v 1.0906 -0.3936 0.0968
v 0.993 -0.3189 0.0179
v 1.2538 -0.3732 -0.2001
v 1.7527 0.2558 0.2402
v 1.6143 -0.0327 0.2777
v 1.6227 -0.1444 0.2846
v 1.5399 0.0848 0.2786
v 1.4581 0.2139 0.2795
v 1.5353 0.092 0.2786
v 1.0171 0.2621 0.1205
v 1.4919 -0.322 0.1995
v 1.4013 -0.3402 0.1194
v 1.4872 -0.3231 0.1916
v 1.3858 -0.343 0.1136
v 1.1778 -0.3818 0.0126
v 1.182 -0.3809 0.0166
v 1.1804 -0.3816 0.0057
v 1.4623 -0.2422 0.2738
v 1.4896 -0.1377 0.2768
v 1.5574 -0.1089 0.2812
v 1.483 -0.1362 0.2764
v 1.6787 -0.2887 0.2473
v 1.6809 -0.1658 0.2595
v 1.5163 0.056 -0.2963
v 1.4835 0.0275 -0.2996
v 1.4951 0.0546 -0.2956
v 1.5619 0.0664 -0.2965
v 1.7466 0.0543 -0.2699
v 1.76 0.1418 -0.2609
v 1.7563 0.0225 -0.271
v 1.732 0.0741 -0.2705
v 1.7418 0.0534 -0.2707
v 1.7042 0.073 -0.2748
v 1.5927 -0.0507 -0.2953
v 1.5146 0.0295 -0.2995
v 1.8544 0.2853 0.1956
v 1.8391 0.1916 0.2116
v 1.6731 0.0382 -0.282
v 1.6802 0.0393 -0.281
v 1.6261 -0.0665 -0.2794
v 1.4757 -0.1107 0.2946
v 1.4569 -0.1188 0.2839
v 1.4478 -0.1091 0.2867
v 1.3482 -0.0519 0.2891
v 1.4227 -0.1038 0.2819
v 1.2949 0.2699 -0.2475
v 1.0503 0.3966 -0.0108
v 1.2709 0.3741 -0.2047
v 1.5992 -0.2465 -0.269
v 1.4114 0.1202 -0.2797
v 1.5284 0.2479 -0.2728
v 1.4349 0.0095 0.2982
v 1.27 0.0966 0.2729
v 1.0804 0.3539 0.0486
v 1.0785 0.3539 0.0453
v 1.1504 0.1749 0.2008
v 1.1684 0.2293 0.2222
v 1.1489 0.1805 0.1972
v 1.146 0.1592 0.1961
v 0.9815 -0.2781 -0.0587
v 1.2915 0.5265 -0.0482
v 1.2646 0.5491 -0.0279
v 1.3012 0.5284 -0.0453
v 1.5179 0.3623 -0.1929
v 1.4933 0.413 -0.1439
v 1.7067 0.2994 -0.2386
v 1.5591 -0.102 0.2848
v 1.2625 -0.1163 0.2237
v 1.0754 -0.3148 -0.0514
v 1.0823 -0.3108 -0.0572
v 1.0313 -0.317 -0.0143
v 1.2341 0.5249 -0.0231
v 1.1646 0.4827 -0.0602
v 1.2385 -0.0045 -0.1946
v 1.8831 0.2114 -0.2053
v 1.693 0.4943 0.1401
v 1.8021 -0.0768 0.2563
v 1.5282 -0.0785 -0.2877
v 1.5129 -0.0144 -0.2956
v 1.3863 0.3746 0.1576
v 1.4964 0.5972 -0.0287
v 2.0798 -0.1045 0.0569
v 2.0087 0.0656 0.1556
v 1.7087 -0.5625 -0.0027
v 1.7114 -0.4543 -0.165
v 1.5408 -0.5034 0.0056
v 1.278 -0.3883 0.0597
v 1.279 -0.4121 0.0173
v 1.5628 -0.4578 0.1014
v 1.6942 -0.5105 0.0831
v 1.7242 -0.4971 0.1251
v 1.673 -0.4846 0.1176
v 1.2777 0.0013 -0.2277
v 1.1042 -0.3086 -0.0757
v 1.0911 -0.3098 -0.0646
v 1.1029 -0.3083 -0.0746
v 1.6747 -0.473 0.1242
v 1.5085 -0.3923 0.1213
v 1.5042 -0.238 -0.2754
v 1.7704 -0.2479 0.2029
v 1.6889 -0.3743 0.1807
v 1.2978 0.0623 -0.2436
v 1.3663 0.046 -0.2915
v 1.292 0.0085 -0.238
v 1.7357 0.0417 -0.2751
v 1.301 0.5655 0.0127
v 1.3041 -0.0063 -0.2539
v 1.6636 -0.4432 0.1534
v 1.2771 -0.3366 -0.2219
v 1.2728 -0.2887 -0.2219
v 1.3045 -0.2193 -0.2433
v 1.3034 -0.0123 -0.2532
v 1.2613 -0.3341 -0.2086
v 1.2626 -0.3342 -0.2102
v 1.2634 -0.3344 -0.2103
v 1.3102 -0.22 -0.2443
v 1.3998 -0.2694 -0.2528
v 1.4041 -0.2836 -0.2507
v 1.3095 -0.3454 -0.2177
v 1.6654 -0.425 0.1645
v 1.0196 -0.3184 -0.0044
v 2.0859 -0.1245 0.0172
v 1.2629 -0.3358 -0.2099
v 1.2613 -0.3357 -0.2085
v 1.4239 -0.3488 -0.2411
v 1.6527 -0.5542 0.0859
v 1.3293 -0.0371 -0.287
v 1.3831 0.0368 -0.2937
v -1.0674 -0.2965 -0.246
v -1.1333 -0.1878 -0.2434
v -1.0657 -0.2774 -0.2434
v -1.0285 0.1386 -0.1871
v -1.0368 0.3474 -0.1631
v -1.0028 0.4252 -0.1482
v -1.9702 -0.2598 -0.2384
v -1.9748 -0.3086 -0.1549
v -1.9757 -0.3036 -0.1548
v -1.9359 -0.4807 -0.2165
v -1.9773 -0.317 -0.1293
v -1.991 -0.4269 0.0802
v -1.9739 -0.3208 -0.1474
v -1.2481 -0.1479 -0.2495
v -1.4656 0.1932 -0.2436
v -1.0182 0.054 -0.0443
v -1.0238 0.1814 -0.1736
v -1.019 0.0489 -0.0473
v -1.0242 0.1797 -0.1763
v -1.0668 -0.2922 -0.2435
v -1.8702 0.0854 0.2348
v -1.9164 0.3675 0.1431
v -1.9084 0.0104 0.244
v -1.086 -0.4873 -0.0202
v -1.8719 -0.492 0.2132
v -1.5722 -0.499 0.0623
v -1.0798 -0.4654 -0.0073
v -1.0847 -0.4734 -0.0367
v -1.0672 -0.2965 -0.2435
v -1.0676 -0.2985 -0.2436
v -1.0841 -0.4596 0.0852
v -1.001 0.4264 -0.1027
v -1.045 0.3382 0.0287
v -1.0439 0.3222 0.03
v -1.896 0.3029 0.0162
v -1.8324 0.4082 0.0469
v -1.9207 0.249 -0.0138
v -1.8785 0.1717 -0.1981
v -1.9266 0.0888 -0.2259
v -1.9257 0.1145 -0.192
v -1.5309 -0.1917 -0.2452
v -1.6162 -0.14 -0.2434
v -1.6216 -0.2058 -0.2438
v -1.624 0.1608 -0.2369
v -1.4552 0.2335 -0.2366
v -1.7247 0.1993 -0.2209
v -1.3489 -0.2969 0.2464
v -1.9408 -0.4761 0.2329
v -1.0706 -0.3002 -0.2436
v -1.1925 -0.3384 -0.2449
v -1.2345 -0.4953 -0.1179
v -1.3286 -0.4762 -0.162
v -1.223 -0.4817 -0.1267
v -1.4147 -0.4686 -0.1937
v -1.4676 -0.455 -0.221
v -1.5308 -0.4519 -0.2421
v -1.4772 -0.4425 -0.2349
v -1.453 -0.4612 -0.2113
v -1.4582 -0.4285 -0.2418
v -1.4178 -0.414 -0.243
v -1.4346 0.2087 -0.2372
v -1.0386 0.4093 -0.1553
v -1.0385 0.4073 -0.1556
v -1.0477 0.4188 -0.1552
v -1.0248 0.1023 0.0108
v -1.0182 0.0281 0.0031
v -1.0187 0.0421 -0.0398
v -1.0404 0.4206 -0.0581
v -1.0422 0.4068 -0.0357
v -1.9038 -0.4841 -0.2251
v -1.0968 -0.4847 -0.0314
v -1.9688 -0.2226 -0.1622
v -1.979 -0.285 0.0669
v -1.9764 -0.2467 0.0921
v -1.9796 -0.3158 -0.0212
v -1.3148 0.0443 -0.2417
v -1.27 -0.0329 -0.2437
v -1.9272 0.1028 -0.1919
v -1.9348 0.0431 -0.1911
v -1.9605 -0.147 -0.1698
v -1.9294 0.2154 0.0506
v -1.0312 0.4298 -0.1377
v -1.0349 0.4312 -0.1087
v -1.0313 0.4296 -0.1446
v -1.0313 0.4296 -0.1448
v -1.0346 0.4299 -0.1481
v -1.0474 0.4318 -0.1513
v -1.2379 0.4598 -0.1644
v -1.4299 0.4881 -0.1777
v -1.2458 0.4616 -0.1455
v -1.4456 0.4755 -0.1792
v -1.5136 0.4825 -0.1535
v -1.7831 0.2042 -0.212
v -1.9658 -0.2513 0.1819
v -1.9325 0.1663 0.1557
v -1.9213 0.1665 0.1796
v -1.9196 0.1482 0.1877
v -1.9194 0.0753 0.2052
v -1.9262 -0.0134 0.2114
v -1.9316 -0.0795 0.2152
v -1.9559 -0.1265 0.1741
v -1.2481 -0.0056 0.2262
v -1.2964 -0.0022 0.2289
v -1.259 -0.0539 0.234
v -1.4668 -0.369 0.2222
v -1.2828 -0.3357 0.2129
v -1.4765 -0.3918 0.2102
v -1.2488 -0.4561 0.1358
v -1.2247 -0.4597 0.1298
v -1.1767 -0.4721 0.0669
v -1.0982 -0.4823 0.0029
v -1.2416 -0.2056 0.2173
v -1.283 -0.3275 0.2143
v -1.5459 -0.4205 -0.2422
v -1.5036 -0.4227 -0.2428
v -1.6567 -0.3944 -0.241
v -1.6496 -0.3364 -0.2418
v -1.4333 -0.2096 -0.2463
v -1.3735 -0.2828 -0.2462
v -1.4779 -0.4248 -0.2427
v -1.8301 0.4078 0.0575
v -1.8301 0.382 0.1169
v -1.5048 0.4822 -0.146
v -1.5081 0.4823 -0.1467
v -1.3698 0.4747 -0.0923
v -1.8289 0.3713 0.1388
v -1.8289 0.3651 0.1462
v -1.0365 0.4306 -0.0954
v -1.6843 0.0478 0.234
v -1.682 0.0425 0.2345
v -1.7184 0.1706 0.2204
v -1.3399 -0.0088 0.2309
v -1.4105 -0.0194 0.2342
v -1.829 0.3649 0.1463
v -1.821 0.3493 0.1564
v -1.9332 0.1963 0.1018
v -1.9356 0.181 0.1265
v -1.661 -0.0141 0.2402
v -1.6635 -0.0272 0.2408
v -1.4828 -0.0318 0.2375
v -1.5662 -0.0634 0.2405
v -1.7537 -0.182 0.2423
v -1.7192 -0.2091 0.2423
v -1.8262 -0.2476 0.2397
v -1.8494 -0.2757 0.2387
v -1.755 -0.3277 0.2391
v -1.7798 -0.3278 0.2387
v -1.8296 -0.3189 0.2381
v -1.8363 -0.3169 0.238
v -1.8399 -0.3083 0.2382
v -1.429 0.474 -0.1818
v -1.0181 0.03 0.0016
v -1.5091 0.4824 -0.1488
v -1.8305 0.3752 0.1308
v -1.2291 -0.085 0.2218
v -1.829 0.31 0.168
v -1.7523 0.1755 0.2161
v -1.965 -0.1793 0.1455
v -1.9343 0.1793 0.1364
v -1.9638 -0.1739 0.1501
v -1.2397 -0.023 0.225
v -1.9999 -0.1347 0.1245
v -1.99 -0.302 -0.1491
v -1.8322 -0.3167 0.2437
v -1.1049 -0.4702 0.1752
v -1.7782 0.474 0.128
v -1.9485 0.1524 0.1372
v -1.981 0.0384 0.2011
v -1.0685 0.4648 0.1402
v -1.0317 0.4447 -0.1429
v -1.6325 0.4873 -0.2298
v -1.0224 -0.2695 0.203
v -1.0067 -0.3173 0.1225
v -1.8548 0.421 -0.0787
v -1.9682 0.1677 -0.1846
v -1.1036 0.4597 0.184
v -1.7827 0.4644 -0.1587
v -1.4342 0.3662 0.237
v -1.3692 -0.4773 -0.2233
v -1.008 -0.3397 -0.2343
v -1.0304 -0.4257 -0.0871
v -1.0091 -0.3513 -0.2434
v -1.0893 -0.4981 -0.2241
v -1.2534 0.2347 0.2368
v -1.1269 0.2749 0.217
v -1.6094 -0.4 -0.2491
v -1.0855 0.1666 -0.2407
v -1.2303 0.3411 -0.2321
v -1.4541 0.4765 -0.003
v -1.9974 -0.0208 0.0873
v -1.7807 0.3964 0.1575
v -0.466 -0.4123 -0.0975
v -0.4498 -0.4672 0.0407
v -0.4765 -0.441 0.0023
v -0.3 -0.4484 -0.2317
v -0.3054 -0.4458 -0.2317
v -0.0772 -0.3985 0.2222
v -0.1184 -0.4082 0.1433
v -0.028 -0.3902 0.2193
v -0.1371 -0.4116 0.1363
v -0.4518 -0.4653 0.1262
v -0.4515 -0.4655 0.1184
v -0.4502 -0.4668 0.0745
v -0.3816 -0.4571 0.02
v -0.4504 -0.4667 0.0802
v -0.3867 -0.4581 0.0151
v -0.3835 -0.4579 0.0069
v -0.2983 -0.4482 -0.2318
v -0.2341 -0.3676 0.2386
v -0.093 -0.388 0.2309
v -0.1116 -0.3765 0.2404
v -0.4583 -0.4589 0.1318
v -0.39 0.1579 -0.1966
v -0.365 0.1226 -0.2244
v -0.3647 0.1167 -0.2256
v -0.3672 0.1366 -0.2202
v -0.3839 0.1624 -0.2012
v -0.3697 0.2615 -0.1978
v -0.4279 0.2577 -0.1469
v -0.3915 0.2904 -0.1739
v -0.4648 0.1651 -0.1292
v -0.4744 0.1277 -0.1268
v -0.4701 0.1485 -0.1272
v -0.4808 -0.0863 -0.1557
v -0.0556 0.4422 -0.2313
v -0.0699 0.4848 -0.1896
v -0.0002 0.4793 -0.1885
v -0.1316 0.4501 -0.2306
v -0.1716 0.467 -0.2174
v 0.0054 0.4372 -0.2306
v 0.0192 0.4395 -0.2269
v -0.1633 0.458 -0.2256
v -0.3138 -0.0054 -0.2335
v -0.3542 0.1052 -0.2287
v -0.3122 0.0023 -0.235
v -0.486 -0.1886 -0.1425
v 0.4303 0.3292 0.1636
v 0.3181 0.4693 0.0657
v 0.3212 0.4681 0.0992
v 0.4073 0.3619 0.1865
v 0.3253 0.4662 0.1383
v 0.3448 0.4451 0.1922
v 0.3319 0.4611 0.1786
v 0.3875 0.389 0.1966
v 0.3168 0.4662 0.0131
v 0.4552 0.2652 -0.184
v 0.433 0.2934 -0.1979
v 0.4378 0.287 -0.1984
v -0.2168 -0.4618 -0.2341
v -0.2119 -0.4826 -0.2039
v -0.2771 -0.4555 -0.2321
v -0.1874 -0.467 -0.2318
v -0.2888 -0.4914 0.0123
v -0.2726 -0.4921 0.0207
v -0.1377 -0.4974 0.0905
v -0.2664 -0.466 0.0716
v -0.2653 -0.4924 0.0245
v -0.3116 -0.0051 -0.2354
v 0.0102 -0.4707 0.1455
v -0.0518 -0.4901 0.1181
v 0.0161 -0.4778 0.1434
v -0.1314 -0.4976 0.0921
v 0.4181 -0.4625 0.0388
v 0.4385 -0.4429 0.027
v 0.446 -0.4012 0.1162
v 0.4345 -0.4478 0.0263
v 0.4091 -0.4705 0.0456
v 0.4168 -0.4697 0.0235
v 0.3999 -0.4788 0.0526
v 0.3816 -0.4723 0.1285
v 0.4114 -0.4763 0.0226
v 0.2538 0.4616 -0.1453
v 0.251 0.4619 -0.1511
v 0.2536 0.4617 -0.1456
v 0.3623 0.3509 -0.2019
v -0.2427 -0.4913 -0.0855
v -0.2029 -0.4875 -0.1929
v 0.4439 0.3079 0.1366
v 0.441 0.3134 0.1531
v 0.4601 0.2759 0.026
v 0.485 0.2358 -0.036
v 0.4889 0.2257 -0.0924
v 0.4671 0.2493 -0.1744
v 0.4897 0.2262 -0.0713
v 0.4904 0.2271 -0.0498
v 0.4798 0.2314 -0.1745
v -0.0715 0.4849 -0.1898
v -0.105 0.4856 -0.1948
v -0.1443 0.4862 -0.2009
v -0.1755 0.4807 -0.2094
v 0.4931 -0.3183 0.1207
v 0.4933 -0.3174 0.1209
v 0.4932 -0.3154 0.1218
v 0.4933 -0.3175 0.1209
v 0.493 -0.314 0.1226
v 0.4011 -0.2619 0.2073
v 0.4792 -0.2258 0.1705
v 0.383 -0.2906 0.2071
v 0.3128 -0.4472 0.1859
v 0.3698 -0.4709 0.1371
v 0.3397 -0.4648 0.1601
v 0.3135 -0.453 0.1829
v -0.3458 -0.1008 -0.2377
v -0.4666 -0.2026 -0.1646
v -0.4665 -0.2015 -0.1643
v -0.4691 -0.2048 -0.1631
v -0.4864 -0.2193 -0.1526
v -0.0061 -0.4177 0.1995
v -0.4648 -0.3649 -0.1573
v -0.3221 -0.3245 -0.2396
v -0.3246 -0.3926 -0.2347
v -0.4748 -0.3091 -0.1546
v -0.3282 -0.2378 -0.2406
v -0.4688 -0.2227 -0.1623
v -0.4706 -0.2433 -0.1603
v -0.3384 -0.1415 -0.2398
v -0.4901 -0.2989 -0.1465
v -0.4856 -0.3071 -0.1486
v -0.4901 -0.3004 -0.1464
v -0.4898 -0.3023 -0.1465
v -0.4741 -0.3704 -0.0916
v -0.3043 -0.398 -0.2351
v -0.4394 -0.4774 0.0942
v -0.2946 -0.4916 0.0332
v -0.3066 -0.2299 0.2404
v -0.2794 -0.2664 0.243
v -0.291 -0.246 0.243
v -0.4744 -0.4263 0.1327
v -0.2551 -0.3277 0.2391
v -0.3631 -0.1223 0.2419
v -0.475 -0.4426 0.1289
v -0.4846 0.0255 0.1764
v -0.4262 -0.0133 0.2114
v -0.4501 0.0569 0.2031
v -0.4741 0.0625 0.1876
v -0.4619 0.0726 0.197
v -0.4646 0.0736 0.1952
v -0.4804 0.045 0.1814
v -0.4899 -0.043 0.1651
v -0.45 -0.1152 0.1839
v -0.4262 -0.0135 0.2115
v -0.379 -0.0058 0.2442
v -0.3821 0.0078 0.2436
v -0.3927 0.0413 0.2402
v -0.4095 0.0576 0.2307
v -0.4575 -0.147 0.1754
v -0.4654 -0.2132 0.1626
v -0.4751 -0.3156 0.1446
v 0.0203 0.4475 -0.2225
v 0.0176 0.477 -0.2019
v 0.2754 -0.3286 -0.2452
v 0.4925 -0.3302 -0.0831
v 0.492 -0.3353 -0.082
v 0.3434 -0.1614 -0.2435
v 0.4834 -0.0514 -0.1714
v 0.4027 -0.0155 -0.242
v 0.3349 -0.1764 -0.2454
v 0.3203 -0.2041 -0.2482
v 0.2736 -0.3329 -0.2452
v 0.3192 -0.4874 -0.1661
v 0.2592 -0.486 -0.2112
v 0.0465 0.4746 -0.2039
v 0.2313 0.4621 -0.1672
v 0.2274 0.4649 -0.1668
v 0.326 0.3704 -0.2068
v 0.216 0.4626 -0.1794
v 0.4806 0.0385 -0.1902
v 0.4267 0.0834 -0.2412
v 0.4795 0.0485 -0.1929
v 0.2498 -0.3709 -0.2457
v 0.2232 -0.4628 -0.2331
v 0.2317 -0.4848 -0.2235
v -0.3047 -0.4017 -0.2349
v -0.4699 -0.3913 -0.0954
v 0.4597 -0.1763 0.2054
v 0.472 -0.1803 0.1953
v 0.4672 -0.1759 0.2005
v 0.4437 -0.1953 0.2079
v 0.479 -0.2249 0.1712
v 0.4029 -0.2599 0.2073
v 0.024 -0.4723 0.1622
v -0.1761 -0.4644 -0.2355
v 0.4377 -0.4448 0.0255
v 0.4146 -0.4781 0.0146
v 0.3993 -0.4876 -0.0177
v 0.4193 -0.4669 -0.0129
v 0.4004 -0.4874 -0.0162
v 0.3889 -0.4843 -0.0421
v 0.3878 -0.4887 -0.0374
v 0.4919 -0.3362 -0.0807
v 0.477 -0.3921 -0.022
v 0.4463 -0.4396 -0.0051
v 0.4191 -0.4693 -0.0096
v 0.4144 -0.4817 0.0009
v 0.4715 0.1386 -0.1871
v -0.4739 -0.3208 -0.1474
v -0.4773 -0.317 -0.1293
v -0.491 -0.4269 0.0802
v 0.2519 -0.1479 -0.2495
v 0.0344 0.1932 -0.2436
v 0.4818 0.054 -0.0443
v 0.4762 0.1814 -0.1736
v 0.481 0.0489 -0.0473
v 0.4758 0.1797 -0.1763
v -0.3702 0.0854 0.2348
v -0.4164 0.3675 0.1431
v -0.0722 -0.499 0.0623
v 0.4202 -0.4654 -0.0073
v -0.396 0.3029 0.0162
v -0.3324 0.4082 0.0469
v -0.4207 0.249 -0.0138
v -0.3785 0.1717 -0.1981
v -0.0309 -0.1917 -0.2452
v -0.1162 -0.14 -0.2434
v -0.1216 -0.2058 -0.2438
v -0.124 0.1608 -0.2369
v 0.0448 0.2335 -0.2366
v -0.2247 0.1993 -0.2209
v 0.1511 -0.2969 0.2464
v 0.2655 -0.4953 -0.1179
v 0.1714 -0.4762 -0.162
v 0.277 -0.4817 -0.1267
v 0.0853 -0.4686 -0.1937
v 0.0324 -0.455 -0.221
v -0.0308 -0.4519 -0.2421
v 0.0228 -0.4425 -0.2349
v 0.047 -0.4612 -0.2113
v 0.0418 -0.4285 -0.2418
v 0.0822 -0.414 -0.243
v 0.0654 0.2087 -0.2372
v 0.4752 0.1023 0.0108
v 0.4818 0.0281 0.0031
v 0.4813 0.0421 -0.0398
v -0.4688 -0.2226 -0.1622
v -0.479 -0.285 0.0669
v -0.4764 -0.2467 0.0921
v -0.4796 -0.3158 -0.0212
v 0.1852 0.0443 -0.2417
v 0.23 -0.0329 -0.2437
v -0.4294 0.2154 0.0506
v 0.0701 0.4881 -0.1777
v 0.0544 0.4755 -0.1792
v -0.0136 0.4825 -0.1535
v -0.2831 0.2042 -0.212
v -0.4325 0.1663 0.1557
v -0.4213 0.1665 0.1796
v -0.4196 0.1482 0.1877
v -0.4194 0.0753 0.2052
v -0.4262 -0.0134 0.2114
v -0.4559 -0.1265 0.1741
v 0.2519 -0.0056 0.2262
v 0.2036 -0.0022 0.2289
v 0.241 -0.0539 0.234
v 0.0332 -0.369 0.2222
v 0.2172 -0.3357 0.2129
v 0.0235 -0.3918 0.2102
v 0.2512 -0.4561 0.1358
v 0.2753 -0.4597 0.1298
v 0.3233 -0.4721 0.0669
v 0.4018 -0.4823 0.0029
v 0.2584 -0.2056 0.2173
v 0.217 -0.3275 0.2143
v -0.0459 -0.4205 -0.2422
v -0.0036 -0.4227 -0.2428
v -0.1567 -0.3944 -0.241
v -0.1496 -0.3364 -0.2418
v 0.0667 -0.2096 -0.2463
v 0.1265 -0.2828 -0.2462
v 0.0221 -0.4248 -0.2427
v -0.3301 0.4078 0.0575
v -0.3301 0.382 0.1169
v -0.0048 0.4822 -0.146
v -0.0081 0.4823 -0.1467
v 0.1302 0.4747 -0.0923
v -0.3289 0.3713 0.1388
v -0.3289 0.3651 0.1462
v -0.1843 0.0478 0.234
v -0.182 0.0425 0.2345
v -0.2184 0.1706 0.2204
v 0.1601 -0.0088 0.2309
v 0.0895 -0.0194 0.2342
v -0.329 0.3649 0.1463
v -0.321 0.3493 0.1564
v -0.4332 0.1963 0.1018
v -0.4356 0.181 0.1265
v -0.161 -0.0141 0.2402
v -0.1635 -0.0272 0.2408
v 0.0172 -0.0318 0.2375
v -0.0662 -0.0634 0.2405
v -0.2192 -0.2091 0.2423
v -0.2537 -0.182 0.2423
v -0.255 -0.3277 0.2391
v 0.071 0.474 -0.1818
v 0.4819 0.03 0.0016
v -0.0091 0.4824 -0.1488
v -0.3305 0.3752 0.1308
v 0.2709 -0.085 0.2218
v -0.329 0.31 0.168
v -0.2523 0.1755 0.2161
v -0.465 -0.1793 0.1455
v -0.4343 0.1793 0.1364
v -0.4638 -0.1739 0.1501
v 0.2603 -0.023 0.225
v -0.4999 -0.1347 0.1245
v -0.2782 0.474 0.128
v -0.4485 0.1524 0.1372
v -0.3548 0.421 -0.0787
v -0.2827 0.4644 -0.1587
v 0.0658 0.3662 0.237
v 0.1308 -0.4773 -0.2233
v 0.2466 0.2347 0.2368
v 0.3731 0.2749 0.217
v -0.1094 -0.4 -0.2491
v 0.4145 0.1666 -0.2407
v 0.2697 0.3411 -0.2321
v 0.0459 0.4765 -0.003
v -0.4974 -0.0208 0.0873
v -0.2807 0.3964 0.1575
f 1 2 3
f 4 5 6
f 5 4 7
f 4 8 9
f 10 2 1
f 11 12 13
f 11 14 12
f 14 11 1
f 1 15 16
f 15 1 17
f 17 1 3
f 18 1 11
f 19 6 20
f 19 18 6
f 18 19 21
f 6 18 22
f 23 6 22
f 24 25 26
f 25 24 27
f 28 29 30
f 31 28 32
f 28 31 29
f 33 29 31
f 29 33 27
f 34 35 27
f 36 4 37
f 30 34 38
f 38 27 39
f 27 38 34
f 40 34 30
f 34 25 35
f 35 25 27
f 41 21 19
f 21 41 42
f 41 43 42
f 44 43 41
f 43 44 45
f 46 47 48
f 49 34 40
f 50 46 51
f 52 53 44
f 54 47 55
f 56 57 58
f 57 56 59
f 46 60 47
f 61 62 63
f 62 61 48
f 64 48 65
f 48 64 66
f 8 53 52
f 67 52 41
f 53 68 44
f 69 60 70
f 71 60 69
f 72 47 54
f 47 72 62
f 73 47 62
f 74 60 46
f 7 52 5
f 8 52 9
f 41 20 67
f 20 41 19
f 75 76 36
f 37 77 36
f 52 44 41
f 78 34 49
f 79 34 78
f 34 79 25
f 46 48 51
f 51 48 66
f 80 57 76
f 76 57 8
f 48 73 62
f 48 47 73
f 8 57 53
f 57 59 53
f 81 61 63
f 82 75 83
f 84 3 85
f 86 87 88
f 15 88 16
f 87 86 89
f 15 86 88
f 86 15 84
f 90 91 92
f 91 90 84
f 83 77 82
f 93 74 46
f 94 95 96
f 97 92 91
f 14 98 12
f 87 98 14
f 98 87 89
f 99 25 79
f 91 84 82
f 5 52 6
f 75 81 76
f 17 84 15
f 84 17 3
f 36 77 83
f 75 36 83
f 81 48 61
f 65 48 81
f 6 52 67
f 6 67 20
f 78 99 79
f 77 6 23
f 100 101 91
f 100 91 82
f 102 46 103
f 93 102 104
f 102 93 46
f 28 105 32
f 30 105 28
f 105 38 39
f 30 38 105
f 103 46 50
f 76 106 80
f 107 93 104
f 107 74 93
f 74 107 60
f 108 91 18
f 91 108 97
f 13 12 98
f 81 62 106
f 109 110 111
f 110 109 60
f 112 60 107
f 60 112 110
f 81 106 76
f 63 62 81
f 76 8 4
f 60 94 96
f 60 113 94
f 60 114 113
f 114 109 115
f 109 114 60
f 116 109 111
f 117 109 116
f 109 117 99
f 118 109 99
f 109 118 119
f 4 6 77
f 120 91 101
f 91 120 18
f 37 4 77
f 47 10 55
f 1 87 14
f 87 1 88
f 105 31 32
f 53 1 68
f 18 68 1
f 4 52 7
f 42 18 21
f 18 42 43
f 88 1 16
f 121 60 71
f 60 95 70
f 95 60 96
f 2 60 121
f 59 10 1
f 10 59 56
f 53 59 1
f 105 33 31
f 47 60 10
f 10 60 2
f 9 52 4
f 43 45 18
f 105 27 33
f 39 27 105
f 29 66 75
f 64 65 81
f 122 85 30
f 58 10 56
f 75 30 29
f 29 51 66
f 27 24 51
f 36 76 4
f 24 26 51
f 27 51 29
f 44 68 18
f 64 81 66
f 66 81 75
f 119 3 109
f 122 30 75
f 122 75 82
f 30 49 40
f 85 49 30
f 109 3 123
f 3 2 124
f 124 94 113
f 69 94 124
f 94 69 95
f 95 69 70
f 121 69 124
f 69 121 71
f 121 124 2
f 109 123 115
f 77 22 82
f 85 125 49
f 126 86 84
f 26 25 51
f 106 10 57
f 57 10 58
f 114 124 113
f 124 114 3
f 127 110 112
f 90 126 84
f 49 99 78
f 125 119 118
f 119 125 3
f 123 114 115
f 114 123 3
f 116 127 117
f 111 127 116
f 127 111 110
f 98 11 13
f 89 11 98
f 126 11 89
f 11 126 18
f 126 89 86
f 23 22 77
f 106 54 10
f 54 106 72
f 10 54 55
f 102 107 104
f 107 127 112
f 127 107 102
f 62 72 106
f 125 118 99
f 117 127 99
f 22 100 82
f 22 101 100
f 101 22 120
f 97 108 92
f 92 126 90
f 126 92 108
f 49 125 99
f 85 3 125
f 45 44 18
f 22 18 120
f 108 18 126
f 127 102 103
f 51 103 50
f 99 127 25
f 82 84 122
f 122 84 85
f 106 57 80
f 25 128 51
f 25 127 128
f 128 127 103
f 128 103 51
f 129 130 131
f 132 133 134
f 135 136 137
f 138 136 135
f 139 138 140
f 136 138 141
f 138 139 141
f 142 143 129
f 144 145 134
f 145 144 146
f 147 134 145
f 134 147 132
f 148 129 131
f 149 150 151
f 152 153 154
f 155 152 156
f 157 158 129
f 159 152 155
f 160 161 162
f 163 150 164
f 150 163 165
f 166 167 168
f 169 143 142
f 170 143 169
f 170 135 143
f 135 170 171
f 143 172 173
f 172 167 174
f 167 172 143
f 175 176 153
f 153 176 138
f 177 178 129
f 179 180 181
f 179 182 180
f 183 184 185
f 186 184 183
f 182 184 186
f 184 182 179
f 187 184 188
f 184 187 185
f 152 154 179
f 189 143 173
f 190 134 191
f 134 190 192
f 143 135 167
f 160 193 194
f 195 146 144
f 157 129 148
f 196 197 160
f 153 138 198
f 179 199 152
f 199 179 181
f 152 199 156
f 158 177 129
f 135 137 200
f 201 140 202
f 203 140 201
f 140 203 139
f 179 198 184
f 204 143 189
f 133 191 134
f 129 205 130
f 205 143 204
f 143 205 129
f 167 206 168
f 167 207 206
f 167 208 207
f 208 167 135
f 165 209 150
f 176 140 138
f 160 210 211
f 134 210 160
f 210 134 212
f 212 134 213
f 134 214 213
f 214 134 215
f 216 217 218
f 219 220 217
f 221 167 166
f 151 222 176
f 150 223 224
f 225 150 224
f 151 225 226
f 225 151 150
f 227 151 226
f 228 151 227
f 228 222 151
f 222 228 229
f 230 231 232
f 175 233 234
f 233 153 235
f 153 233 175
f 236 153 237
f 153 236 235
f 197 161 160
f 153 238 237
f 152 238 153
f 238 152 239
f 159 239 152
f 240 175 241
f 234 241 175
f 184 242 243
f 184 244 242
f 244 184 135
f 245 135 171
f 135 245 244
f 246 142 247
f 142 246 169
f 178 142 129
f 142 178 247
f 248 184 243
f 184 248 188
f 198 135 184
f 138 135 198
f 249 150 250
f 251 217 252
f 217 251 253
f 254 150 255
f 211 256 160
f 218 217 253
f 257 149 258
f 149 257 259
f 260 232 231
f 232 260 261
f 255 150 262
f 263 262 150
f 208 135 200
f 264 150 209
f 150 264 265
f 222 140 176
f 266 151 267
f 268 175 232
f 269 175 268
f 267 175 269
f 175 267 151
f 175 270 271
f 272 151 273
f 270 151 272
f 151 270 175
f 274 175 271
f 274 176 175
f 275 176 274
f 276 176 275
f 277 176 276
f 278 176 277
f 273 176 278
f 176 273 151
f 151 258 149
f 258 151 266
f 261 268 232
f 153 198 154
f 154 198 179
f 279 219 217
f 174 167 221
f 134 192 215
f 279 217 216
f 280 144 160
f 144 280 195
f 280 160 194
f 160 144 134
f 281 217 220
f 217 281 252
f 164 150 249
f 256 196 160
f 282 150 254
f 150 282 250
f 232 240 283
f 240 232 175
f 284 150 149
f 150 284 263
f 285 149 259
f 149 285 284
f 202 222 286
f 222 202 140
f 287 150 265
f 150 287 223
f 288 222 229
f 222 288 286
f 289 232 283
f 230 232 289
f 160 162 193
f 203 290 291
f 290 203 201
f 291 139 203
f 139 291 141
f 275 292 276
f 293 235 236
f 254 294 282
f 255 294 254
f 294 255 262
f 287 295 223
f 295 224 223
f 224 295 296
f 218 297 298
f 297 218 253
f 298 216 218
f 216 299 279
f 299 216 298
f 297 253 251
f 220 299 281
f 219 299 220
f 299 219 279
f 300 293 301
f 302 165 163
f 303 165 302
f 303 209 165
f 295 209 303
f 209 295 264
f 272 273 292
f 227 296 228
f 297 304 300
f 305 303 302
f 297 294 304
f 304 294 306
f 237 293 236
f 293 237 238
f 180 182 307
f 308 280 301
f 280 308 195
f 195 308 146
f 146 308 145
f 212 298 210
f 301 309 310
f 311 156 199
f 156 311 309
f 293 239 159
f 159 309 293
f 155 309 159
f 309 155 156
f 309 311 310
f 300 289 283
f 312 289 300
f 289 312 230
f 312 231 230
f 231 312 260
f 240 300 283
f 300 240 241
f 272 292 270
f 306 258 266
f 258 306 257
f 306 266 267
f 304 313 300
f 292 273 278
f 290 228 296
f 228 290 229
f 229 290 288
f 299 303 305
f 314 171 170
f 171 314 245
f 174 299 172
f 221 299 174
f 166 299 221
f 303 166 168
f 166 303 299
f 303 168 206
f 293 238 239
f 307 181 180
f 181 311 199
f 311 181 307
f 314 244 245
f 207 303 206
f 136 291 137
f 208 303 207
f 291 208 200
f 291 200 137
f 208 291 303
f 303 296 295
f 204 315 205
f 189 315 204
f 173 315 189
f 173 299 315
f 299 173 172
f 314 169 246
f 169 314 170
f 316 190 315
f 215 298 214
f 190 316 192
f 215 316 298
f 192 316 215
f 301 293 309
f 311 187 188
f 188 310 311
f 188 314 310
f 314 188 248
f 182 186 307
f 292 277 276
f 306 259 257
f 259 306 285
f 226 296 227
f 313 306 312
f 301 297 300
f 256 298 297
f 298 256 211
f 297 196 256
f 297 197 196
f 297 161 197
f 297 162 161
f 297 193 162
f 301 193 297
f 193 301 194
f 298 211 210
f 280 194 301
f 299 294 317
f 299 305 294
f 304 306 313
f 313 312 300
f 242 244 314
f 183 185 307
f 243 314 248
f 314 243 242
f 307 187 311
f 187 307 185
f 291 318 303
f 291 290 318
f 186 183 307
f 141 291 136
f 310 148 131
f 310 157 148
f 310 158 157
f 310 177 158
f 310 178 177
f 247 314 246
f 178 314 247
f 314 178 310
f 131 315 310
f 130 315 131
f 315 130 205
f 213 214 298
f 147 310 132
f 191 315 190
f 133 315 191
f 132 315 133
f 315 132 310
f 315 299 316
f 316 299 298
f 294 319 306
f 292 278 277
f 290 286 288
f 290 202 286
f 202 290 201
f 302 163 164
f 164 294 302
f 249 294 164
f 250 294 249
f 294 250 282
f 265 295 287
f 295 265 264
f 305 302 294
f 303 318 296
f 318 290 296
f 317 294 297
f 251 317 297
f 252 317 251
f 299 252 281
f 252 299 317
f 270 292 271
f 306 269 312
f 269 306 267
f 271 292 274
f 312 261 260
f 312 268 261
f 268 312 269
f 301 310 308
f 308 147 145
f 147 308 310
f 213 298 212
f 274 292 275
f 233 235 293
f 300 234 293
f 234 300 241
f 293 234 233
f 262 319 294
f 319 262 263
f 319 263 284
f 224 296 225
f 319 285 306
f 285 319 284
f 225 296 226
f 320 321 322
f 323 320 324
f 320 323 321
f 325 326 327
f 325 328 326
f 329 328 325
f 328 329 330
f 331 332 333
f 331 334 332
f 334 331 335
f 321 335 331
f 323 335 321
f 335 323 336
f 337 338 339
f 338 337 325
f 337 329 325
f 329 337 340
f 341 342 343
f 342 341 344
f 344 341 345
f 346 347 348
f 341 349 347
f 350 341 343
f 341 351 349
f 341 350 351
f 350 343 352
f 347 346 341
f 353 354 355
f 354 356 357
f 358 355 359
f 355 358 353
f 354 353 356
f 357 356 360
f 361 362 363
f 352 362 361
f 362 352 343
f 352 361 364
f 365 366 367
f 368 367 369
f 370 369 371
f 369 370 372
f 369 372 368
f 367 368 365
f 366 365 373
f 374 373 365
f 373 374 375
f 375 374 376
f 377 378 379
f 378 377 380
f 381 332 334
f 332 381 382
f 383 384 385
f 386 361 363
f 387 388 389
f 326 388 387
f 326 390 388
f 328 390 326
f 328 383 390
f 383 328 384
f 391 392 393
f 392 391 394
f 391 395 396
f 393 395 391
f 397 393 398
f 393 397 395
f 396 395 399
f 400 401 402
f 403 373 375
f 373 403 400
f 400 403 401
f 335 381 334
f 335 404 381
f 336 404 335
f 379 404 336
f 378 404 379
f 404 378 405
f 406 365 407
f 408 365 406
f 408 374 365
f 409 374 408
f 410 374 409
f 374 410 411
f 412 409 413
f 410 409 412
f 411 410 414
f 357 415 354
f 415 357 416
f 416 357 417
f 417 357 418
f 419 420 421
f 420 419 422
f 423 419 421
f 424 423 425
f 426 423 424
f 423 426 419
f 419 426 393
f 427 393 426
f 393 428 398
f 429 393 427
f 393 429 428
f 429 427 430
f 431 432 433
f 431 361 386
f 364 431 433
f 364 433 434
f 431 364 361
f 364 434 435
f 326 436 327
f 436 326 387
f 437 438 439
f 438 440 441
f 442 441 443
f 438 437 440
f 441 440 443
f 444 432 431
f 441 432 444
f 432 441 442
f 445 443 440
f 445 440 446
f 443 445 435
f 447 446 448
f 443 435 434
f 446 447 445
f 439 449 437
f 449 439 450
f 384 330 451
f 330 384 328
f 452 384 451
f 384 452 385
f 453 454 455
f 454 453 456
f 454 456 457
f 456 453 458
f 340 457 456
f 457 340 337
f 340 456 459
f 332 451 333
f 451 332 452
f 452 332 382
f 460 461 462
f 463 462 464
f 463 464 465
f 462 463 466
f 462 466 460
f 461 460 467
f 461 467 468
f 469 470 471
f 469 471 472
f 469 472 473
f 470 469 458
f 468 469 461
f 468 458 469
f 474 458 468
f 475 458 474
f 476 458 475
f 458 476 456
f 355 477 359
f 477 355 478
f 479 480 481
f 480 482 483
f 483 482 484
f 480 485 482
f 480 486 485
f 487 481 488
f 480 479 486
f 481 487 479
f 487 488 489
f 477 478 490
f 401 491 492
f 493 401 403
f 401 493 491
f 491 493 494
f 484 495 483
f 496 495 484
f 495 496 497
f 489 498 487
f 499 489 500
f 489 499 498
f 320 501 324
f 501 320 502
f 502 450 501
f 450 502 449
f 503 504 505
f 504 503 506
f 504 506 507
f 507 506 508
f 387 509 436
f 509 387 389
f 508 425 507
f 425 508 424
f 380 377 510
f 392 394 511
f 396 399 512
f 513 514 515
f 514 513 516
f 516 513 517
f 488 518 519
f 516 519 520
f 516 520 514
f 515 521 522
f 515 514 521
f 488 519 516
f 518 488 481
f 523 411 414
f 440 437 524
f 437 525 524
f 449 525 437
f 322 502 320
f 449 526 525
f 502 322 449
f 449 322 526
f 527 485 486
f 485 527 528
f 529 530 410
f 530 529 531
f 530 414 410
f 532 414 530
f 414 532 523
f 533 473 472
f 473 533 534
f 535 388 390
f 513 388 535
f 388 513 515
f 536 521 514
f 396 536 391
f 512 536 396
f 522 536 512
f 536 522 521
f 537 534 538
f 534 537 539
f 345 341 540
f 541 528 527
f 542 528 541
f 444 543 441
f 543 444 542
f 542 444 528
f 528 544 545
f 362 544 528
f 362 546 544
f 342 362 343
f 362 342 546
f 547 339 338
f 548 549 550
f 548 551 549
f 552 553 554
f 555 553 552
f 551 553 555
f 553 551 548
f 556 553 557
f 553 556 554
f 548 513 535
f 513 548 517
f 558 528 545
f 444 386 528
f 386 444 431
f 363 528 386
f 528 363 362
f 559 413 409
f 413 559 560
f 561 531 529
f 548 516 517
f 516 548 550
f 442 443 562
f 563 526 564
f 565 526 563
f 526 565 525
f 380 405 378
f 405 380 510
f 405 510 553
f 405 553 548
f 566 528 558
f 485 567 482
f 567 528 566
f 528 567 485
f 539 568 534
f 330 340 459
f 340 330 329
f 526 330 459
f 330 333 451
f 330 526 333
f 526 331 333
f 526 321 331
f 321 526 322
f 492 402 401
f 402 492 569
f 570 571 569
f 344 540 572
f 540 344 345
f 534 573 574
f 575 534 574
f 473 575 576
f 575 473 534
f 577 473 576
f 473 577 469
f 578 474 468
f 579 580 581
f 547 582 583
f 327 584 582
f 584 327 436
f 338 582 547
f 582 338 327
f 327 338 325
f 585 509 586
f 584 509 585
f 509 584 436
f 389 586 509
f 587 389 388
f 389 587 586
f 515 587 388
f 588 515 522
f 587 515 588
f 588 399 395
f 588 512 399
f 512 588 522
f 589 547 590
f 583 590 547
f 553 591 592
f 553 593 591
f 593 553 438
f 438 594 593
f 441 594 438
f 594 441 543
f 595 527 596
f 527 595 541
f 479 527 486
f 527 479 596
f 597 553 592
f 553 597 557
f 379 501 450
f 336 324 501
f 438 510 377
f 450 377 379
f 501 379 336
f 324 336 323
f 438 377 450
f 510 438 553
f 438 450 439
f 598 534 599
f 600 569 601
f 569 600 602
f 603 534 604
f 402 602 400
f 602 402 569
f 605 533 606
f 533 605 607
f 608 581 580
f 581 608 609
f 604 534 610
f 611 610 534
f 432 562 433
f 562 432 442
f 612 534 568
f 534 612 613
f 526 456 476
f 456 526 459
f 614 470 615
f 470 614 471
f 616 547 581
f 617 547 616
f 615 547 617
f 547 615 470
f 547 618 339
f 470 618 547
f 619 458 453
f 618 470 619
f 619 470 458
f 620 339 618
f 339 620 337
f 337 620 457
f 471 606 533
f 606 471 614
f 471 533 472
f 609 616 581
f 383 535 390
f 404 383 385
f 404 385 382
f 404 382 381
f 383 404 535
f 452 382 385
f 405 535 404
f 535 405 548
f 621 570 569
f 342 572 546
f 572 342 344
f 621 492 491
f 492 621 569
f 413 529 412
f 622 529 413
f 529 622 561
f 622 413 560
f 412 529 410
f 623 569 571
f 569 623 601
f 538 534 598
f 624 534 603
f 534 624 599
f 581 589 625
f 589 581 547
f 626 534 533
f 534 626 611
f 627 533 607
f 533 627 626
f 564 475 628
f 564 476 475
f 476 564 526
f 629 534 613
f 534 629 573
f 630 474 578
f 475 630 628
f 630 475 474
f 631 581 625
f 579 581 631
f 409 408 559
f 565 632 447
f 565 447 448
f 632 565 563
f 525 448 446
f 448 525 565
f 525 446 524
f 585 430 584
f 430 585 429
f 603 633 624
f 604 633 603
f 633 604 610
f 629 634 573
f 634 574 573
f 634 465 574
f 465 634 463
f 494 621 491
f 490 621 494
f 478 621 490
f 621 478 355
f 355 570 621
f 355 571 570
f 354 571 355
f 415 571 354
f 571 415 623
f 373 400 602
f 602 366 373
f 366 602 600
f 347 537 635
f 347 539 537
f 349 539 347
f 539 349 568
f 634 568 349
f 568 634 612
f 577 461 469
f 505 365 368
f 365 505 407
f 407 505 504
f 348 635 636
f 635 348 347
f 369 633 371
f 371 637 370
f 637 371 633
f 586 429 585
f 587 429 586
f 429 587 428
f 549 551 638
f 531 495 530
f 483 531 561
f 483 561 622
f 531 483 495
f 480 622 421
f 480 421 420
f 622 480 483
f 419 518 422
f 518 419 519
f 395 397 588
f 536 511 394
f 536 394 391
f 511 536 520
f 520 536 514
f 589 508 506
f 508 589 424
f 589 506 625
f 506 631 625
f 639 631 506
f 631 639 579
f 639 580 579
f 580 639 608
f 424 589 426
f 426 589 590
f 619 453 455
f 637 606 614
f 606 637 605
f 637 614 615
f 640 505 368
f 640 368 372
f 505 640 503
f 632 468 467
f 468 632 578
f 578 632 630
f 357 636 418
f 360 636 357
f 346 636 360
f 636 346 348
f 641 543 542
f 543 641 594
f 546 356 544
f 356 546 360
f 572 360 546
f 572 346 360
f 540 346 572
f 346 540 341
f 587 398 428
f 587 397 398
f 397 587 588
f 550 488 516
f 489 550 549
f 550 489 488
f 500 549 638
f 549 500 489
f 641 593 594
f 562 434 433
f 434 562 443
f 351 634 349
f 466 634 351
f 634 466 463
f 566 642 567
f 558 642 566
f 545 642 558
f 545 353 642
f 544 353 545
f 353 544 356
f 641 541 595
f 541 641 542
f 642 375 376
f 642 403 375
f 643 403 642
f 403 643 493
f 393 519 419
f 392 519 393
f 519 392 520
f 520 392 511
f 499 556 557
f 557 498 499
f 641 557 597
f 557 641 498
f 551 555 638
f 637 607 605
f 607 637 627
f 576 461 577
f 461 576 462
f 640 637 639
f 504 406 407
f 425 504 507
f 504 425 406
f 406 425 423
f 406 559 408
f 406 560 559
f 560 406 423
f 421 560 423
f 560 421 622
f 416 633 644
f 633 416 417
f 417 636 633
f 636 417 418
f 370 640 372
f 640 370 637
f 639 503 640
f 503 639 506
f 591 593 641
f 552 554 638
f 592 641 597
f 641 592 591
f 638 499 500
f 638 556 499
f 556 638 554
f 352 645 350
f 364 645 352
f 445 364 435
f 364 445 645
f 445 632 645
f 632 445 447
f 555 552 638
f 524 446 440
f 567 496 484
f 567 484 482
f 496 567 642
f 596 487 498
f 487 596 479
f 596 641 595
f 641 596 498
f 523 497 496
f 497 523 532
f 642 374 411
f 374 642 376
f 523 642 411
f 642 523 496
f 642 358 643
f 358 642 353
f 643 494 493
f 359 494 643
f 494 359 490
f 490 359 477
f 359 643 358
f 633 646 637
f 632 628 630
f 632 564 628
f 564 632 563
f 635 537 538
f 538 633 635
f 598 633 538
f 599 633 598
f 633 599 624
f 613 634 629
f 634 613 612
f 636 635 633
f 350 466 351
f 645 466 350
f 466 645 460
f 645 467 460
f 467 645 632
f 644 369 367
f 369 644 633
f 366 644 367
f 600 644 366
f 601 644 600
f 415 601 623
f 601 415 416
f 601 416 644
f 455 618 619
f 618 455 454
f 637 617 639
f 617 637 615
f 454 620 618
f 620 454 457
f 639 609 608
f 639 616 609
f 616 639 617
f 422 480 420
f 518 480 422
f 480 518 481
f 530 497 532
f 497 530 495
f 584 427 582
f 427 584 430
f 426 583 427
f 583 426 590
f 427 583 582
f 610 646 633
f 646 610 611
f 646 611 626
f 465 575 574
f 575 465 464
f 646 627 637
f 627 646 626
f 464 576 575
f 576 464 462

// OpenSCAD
Seed=1;//[0:1000]
s=1.2;//[0.8:0.01:1.5]
color("Grey")translate([1.5,0,0])scale([1,1,0.5])boulder(Seed);
color("DarkGrey")translate([-1.5,0,0])scale([1,1,0.5])cutstone(Seed);

intersection(){
color("Grey")translate([0,0,0])scale([s,s,s*0.5])boulder(Seed);
color("DarkGrey")translate([0,0,0])scale([1,1,0.5])cutstone(Seed);
}


//////////////// stones ////////////////
module boulder(bseed){
loops=6;n=10;l=n*5;ri=rands(0,360,l,bseed);t=rands(-180,180,l,bseed+1);
for(loop=[0:loops]){v21=rands(0,l-1,n*3+1,bseed+loop);
v1=[for(i=[0:l])[sin(ri[i])*cos(t[i]),cos(ri[i])*cos(t[i]),sin(t[i])]];
v2=[for(j=[0:n])[v21[j],v21[j+n],v21[j+n+n]]];
color("Gray")scale(0.6)hull()polyhedron(v1,v2);}}
module cutstone(bseed){
loops=1;l=200;n=100;
for(loop=[0:loops]){l1=rands(-0.5,0.5,l*3+3,bseed+loop);
v21=rands(0,l-1,n*3+1,bseed+loop);
v1=[for(i=[0:l])[l1[i],l1[i+l],l1[i+l+1]]];v2=[for(j=[0:n])[v21[j],v21[j+n],v21[j+n+n]]];
color("Gray")hull()polyhedron(v1,v2);}}
